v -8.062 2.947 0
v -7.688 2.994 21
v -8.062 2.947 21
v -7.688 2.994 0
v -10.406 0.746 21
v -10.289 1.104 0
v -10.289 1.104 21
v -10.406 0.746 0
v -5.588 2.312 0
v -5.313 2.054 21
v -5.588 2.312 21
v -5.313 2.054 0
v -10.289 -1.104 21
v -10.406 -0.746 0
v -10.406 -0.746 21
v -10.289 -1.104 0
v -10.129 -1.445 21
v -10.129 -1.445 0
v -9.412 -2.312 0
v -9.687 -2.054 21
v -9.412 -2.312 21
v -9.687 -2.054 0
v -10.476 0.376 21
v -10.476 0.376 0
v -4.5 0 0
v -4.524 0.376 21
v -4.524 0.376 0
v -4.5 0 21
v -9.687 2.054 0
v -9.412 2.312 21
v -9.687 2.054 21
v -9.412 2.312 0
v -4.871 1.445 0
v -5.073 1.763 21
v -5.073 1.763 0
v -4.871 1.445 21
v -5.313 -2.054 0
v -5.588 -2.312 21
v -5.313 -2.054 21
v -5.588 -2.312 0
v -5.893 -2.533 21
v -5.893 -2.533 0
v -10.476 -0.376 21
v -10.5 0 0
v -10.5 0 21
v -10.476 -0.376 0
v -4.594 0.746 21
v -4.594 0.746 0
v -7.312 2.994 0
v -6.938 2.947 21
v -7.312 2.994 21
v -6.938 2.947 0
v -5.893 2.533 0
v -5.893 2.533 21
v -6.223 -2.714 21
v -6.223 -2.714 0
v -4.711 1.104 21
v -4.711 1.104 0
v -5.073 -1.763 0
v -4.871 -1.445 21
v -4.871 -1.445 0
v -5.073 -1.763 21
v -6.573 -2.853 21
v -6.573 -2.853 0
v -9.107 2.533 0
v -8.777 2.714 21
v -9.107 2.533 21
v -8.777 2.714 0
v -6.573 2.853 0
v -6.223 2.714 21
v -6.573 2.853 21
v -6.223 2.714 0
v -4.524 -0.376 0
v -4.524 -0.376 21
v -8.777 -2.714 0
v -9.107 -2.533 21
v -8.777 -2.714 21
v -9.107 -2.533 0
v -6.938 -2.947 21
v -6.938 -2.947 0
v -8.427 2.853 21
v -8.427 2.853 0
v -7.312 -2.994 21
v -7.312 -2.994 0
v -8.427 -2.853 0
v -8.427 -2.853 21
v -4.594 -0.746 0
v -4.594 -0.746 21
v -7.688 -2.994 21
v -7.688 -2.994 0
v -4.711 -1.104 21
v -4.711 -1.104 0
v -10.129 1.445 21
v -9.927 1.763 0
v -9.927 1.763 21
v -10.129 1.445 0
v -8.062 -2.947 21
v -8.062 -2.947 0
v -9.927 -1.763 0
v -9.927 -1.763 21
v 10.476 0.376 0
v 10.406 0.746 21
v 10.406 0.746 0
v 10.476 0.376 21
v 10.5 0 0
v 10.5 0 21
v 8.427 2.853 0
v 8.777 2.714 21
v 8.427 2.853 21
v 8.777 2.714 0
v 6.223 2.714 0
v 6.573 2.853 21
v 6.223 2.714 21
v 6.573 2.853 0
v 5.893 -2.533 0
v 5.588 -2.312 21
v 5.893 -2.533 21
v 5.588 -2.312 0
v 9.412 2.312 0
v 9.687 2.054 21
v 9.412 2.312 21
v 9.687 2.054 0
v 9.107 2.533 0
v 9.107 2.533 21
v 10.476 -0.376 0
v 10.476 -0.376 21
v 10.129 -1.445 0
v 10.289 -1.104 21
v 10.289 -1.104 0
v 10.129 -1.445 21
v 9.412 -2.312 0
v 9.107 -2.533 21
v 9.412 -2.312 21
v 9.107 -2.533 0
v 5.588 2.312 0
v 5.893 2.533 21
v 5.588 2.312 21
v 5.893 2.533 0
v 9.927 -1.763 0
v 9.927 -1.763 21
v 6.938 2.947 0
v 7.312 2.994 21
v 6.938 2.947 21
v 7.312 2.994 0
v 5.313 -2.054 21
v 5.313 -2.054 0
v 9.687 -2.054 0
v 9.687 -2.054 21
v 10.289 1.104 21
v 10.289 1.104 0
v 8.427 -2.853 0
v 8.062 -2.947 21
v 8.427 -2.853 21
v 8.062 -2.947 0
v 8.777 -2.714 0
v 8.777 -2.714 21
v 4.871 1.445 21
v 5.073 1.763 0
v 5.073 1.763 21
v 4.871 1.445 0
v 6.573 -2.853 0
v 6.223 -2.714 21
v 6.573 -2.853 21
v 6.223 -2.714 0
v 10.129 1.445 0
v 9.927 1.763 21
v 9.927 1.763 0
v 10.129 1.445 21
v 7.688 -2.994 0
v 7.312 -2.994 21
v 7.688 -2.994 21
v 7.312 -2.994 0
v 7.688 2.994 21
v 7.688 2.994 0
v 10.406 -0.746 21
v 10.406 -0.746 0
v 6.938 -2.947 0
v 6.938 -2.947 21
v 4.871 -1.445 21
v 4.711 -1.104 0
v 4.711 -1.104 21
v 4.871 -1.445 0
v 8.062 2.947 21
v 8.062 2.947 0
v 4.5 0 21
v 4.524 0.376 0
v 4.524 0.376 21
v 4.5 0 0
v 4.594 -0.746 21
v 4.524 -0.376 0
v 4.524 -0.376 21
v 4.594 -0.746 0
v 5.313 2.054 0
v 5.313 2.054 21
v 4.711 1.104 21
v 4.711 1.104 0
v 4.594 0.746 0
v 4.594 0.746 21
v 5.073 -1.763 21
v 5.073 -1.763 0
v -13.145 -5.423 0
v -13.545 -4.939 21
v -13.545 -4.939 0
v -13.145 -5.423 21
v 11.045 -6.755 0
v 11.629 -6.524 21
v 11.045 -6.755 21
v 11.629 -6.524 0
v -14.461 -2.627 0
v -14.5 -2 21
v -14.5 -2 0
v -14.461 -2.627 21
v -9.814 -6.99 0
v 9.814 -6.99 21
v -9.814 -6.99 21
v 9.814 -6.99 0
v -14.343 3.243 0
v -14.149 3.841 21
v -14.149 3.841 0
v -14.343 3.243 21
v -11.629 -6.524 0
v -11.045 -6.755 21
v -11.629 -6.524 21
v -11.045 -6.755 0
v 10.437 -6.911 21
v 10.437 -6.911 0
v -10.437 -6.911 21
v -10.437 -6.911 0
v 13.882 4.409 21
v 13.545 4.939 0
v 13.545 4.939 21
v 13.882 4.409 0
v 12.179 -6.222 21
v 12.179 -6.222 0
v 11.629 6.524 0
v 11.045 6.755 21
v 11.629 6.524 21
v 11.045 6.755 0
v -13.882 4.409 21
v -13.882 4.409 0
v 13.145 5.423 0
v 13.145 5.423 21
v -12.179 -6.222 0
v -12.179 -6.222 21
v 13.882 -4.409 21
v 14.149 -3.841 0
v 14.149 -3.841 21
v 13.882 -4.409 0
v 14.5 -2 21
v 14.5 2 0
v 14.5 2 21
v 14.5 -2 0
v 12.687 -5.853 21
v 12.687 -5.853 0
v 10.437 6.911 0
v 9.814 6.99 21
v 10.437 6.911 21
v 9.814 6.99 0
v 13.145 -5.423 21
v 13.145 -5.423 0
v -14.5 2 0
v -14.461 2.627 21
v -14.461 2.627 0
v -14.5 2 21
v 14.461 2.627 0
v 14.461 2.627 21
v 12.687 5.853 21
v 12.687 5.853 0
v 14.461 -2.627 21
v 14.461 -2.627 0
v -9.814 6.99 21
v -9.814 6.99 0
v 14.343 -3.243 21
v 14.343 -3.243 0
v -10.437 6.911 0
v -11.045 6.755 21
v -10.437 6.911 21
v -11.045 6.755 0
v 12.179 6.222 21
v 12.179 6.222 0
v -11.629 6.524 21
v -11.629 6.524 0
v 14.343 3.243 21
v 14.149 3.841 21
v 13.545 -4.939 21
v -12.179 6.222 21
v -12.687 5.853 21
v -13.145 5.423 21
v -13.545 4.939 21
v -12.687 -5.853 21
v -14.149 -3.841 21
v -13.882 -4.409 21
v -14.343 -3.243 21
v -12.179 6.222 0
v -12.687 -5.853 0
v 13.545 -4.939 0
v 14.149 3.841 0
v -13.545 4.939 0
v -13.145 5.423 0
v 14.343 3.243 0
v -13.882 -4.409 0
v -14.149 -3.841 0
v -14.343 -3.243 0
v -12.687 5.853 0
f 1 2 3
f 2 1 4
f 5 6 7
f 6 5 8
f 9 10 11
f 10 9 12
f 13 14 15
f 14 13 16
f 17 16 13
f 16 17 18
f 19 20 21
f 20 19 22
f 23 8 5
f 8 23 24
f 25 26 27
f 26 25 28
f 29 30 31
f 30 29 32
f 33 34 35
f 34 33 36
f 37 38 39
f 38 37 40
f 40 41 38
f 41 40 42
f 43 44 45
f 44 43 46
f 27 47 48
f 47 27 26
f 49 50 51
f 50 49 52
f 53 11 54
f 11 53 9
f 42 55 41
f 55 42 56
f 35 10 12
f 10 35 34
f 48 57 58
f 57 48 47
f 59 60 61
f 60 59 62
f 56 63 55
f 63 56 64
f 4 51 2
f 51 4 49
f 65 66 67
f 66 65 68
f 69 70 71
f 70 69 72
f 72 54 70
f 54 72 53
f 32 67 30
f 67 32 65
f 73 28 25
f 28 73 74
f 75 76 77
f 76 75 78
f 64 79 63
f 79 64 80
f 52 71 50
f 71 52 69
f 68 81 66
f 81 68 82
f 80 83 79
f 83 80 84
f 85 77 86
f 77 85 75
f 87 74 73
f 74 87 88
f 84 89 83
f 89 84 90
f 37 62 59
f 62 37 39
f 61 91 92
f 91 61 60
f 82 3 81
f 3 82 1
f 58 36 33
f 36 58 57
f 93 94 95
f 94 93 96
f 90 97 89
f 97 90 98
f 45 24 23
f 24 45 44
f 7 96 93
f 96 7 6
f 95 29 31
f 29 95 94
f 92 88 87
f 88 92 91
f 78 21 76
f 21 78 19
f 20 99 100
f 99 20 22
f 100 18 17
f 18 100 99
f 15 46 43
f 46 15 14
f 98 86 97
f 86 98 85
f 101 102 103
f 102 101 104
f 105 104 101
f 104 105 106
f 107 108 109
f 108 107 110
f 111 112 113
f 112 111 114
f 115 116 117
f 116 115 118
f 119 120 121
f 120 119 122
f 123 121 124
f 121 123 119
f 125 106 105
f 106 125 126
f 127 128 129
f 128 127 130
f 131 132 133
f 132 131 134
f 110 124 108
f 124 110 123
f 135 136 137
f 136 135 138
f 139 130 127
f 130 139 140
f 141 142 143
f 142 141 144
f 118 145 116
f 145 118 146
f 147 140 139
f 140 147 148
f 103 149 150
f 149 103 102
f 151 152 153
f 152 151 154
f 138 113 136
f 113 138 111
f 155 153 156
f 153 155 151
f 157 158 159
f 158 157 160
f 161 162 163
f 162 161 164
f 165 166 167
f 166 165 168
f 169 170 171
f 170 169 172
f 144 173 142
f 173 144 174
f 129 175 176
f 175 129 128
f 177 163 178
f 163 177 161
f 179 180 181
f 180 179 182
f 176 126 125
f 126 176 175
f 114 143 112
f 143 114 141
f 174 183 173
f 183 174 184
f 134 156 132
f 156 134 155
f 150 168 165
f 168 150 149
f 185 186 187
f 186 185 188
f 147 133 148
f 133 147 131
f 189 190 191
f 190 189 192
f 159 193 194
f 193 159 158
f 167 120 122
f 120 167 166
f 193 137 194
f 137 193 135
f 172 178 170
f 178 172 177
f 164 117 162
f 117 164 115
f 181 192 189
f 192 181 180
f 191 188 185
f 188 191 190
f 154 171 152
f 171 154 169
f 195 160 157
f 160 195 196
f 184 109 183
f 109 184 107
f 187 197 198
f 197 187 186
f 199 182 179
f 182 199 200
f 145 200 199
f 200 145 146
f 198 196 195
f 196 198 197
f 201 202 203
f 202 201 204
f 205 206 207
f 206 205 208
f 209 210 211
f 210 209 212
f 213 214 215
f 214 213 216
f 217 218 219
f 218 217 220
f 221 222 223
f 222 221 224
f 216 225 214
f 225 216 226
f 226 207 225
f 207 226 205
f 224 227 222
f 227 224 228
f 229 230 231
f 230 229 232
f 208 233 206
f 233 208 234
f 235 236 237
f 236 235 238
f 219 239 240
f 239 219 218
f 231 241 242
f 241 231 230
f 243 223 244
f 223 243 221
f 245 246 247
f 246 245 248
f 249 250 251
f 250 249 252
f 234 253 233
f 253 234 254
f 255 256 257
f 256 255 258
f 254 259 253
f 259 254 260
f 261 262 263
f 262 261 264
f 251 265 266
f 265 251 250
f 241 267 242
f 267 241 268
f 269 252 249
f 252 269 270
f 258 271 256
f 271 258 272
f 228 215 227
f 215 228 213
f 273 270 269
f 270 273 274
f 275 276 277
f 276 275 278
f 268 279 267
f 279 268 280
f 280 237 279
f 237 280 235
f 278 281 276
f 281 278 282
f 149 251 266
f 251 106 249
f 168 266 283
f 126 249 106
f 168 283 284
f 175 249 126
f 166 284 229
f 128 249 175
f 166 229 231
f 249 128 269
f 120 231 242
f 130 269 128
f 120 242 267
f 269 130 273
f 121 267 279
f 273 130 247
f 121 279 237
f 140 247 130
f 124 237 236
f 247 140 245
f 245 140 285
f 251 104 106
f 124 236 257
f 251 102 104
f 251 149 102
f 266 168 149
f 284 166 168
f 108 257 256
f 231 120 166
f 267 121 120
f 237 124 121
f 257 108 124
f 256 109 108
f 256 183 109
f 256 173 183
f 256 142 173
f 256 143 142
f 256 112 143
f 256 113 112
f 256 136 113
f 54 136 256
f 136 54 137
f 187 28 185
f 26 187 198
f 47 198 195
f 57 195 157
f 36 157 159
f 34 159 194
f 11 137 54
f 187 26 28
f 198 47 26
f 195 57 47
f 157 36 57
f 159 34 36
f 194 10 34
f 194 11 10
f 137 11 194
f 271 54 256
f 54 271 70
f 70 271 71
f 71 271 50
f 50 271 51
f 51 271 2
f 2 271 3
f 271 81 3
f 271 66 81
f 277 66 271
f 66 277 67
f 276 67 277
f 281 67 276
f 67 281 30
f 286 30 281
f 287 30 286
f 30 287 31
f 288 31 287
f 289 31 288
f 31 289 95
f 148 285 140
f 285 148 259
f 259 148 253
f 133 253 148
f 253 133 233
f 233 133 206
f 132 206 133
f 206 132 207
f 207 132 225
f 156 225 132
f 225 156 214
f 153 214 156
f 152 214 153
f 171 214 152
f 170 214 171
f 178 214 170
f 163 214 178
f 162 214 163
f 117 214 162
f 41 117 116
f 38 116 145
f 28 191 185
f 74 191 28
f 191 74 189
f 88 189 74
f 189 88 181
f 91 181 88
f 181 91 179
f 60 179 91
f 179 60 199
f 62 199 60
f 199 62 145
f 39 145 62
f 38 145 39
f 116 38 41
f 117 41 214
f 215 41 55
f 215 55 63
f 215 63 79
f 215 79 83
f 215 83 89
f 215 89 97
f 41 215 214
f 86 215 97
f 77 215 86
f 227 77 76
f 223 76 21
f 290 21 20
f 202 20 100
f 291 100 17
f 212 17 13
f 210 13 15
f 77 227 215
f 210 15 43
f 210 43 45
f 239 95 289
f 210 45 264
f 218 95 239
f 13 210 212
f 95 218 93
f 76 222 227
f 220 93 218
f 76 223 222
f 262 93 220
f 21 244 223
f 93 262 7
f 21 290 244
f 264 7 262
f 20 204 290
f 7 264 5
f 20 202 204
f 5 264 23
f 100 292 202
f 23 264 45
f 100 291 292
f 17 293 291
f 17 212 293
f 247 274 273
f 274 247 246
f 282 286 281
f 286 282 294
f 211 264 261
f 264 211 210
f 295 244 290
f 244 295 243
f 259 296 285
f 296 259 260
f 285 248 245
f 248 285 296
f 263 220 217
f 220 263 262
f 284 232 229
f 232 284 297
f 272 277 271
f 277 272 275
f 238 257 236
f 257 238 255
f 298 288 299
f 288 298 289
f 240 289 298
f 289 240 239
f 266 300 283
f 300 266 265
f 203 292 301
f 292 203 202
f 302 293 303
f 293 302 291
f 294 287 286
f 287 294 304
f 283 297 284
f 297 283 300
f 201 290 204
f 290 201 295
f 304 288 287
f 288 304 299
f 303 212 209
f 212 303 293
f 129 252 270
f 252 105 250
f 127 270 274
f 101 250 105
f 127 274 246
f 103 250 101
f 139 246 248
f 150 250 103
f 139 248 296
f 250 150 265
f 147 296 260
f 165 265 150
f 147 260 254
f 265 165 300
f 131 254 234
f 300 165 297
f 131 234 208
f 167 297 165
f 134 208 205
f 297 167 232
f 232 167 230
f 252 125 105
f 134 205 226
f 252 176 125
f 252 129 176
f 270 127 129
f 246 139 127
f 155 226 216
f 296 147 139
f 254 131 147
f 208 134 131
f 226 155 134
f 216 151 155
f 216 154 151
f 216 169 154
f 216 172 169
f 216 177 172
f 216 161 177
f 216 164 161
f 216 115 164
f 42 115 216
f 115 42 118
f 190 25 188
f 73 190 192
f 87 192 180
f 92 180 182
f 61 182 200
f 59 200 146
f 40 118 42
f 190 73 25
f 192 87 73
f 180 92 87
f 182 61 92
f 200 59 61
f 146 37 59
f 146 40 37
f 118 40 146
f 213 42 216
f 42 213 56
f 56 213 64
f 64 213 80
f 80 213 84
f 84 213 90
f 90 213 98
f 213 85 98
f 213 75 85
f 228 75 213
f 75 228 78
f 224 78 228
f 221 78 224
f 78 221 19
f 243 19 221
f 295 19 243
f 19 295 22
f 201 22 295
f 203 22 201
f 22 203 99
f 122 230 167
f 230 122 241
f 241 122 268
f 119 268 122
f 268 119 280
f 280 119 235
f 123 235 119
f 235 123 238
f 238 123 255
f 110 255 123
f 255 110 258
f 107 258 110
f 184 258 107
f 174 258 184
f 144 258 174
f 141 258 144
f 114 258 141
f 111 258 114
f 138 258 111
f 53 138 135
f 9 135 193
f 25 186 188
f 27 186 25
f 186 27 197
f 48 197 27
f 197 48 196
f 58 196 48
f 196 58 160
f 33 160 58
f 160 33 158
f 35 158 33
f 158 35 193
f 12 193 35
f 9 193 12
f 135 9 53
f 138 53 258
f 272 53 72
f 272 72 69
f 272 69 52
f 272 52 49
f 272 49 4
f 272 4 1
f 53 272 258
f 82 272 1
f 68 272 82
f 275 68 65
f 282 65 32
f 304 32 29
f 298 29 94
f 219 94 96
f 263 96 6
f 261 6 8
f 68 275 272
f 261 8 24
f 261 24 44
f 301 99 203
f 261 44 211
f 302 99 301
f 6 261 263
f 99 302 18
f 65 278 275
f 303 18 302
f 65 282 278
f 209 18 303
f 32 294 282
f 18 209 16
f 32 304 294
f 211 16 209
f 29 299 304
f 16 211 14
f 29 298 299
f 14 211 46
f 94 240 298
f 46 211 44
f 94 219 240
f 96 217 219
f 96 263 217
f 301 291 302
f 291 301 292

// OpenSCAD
$fn = 50;


difference() {
	union() {
		hull() {
			translate(v = [-9.5000000000, 2.0000000000, 0]) {
				cylinder(h = 21, r = 5);
			}
			translate(v = [9.5000000000, 2.0000000000, 0]) {
				cylinder(h = 21, r = 5);
			}
			translate(v = [-9.5000000000, -2.0000000000, 0]) {
				cylinder(h = 21, r = 5);
			}
			translate(v = [9.5000000000, -2.0000000000, 0]) {
				cylinder(h = 21, r = 5);
			}
		}
	}
	union() {
		translate(v = [-7.5000000000, 0.0000000000, -100.0000000000]) {
			cylinder(h = 200, r = 3.0000000000);
		}
		translate(v = [-7.5000000000, 0.0000000000, -100.0000000000]) {
			cylinder(h = 200, r = 3.0000000000);
		}
		translate(v = [7.5000000000, 0.0000000000, -100.0000000000]) {
			cylinder(h = 200, r = 3.0000000000);
		}
		translate(v = [7.5000000000, 0.0000000000, -100.0000000000]) {
			cylinder(h = 200, r = 3.0000000000);
		}
	}
}
